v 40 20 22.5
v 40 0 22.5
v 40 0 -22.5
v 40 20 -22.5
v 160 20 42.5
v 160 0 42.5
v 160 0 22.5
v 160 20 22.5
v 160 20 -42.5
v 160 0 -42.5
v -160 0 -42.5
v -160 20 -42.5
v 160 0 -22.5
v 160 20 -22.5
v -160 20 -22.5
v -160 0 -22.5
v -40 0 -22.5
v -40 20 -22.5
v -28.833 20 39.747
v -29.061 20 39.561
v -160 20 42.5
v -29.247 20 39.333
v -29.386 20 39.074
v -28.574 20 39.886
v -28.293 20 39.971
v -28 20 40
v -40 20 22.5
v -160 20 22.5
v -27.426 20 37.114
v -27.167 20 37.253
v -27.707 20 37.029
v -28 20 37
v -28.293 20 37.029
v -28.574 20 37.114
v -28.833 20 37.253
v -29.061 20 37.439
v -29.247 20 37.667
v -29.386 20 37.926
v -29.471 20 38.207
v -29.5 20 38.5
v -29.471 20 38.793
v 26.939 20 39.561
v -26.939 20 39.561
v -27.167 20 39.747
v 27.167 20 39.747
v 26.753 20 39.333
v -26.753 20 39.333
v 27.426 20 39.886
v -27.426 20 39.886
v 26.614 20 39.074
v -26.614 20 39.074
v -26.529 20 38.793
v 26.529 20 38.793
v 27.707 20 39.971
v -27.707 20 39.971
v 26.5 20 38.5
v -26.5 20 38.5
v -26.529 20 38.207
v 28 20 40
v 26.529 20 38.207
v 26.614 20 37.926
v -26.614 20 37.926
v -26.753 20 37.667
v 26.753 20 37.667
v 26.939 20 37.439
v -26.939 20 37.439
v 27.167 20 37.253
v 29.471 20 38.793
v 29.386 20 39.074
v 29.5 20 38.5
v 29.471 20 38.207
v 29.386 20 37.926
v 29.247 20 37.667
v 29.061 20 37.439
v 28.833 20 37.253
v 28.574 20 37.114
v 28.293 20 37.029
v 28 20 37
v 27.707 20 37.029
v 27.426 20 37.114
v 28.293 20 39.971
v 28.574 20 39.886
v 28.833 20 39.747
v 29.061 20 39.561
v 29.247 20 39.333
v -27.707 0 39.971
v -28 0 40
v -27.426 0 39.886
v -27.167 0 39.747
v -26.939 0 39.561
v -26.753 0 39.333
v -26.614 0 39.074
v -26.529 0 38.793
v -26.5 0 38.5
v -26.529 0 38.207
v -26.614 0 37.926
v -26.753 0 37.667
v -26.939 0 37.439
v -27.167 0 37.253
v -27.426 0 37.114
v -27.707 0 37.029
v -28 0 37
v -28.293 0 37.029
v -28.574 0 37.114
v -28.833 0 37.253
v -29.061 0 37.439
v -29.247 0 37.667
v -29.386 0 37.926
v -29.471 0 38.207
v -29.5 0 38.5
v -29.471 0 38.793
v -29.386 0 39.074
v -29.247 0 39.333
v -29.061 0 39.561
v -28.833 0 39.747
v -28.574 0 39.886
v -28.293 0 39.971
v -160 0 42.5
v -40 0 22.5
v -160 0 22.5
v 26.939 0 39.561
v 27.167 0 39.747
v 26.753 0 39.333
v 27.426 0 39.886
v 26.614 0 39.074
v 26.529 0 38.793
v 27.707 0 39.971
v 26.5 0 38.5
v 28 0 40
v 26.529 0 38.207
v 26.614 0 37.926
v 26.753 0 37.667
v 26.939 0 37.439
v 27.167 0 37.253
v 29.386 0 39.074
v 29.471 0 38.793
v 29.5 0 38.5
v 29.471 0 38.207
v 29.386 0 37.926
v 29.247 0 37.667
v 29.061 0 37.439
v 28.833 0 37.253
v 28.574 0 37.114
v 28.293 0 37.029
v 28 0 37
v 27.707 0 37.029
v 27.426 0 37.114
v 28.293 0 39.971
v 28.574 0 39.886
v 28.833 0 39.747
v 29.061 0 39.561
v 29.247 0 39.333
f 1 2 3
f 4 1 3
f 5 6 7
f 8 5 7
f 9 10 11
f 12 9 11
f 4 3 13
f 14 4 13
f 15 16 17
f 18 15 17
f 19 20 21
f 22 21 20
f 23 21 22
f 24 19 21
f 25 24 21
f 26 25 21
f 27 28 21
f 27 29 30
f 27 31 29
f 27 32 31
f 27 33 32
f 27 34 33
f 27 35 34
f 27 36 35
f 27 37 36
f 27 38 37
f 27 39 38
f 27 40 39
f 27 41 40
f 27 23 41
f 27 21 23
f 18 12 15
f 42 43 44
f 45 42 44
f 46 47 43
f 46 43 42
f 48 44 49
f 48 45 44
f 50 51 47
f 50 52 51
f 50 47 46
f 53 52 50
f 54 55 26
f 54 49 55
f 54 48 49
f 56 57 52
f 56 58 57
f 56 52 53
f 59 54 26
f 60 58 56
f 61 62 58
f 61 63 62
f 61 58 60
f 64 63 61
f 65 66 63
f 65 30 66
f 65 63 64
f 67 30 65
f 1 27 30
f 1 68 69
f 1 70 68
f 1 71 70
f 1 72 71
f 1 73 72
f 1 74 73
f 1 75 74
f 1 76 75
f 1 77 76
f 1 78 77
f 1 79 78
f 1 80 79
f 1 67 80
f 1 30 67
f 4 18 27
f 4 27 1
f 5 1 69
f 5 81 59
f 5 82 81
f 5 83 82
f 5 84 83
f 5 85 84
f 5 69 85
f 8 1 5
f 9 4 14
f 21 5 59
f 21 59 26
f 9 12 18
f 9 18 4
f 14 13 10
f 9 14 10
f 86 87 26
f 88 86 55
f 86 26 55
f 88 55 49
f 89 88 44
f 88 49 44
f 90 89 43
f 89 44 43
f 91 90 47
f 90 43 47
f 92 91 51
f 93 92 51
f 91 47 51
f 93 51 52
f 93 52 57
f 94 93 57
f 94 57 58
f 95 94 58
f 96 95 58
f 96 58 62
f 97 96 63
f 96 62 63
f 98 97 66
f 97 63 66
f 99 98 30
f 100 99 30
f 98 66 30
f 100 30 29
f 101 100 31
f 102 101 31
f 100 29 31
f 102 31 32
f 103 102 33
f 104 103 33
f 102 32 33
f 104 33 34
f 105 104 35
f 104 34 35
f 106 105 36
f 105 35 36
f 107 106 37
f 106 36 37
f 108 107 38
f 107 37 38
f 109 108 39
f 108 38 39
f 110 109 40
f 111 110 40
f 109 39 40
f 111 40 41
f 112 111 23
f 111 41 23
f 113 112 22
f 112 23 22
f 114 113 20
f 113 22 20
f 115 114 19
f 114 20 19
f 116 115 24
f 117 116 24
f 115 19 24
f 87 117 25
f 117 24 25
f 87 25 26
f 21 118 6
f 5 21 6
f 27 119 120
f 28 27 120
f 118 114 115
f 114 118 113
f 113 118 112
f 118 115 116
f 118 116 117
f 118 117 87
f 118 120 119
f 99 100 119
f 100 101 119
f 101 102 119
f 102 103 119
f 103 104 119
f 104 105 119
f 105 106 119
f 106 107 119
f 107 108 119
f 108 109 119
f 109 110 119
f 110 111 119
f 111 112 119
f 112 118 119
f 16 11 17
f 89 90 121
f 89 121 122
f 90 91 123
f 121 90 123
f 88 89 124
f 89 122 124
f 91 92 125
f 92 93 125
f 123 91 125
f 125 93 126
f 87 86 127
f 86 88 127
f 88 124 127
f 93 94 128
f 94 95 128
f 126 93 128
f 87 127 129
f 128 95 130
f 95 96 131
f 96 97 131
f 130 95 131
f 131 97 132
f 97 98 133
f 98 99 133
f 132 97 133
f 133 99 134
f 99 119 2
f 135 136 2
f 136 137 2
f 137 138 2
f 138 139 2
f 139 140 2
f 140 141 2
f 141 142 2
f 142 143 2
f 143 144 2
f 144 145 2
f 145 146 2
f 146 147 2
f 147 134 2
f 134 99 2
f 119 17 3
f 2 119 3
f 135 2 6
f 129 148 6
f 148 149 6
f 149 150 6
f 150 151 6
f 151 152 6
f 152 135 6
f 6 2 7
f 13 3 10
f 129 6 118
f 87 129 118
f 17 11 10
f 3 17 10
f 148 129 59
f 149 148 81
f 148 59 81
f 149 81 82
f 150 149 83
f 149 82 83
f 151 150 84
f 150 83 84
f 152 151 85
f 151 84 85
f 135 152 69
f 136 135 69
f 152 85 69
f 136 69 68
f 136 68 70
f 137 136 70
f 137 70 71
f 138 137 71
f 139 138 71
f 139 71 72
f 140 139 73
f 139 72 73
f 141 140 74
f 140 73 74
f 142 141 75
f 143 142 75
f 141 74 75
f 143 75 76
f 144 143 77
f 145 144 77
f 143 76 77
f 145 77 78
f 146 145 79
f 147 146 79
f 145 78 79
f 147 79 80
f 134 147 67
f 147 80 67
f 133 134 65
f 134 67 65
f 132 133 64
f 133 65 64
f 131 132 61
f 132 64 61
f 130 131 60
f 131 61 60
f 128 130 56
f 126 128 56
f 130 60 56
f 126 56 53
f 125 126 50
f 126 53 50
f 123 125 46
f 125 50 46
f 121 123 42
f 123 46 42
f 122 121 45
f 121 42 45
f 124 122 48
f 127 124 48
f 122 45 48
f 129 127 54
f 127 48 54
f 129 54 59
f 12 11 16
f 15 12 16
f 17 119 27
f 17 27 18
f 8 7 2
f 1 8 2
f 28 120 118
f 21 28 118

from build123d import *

# Parameters (mm, degrees)
SKETCH1_W           = 80
SKETCH1_H           = 45
BOSS_EXTRUDE2_DEPTH = 20
SKETCH3_R           = 1.5
CUT_EXTRUDE7_DEPTH  = 20


with BuildPart() as part:
    # Sketch1 → Boss-Extrude2 (new body)
    with BuildSketch(Plane(origin=(0, 0, 0), x_dir=(1, 0, 0), z_dir=(0, 1, 0))):
        Polygon((-40, -22.5), (-160, -22.5), (-160, -42.5), (160, -42.5), (160, -22.5), (40, -22.5), align=None)
        Rectangle(SKETCH1_W, SKETCH1_H)
        Polygon((160, 42.5), (-160, 42.5), (-160, 22.5), (-40, 22.5), (40, 22.5), (160, 22.5), align=None)
    extrude(amount=BOSS_EXTRUDE2_DEPTH)

    # Sketch3 → Cut-Extrude7 (cut)
    with BuildSketch(Plane(origin=(0, 20, 0), x_dir=(1, 0, 0), z_dir=(0, 1, 0))):
        with Locations(Location((-28, -38.5, 0), (0, 0, 270))):
            Circle(SKETCH3_R)
        with Locations(Location((28, -38.5, 0), (0, 0, 270))):
            Circle(SKETCH3_R)
    extrude(amount=-CUT_EXTRUDE7_DEPTH, mode=Mode.SUBTRACT)


solid = part.part
